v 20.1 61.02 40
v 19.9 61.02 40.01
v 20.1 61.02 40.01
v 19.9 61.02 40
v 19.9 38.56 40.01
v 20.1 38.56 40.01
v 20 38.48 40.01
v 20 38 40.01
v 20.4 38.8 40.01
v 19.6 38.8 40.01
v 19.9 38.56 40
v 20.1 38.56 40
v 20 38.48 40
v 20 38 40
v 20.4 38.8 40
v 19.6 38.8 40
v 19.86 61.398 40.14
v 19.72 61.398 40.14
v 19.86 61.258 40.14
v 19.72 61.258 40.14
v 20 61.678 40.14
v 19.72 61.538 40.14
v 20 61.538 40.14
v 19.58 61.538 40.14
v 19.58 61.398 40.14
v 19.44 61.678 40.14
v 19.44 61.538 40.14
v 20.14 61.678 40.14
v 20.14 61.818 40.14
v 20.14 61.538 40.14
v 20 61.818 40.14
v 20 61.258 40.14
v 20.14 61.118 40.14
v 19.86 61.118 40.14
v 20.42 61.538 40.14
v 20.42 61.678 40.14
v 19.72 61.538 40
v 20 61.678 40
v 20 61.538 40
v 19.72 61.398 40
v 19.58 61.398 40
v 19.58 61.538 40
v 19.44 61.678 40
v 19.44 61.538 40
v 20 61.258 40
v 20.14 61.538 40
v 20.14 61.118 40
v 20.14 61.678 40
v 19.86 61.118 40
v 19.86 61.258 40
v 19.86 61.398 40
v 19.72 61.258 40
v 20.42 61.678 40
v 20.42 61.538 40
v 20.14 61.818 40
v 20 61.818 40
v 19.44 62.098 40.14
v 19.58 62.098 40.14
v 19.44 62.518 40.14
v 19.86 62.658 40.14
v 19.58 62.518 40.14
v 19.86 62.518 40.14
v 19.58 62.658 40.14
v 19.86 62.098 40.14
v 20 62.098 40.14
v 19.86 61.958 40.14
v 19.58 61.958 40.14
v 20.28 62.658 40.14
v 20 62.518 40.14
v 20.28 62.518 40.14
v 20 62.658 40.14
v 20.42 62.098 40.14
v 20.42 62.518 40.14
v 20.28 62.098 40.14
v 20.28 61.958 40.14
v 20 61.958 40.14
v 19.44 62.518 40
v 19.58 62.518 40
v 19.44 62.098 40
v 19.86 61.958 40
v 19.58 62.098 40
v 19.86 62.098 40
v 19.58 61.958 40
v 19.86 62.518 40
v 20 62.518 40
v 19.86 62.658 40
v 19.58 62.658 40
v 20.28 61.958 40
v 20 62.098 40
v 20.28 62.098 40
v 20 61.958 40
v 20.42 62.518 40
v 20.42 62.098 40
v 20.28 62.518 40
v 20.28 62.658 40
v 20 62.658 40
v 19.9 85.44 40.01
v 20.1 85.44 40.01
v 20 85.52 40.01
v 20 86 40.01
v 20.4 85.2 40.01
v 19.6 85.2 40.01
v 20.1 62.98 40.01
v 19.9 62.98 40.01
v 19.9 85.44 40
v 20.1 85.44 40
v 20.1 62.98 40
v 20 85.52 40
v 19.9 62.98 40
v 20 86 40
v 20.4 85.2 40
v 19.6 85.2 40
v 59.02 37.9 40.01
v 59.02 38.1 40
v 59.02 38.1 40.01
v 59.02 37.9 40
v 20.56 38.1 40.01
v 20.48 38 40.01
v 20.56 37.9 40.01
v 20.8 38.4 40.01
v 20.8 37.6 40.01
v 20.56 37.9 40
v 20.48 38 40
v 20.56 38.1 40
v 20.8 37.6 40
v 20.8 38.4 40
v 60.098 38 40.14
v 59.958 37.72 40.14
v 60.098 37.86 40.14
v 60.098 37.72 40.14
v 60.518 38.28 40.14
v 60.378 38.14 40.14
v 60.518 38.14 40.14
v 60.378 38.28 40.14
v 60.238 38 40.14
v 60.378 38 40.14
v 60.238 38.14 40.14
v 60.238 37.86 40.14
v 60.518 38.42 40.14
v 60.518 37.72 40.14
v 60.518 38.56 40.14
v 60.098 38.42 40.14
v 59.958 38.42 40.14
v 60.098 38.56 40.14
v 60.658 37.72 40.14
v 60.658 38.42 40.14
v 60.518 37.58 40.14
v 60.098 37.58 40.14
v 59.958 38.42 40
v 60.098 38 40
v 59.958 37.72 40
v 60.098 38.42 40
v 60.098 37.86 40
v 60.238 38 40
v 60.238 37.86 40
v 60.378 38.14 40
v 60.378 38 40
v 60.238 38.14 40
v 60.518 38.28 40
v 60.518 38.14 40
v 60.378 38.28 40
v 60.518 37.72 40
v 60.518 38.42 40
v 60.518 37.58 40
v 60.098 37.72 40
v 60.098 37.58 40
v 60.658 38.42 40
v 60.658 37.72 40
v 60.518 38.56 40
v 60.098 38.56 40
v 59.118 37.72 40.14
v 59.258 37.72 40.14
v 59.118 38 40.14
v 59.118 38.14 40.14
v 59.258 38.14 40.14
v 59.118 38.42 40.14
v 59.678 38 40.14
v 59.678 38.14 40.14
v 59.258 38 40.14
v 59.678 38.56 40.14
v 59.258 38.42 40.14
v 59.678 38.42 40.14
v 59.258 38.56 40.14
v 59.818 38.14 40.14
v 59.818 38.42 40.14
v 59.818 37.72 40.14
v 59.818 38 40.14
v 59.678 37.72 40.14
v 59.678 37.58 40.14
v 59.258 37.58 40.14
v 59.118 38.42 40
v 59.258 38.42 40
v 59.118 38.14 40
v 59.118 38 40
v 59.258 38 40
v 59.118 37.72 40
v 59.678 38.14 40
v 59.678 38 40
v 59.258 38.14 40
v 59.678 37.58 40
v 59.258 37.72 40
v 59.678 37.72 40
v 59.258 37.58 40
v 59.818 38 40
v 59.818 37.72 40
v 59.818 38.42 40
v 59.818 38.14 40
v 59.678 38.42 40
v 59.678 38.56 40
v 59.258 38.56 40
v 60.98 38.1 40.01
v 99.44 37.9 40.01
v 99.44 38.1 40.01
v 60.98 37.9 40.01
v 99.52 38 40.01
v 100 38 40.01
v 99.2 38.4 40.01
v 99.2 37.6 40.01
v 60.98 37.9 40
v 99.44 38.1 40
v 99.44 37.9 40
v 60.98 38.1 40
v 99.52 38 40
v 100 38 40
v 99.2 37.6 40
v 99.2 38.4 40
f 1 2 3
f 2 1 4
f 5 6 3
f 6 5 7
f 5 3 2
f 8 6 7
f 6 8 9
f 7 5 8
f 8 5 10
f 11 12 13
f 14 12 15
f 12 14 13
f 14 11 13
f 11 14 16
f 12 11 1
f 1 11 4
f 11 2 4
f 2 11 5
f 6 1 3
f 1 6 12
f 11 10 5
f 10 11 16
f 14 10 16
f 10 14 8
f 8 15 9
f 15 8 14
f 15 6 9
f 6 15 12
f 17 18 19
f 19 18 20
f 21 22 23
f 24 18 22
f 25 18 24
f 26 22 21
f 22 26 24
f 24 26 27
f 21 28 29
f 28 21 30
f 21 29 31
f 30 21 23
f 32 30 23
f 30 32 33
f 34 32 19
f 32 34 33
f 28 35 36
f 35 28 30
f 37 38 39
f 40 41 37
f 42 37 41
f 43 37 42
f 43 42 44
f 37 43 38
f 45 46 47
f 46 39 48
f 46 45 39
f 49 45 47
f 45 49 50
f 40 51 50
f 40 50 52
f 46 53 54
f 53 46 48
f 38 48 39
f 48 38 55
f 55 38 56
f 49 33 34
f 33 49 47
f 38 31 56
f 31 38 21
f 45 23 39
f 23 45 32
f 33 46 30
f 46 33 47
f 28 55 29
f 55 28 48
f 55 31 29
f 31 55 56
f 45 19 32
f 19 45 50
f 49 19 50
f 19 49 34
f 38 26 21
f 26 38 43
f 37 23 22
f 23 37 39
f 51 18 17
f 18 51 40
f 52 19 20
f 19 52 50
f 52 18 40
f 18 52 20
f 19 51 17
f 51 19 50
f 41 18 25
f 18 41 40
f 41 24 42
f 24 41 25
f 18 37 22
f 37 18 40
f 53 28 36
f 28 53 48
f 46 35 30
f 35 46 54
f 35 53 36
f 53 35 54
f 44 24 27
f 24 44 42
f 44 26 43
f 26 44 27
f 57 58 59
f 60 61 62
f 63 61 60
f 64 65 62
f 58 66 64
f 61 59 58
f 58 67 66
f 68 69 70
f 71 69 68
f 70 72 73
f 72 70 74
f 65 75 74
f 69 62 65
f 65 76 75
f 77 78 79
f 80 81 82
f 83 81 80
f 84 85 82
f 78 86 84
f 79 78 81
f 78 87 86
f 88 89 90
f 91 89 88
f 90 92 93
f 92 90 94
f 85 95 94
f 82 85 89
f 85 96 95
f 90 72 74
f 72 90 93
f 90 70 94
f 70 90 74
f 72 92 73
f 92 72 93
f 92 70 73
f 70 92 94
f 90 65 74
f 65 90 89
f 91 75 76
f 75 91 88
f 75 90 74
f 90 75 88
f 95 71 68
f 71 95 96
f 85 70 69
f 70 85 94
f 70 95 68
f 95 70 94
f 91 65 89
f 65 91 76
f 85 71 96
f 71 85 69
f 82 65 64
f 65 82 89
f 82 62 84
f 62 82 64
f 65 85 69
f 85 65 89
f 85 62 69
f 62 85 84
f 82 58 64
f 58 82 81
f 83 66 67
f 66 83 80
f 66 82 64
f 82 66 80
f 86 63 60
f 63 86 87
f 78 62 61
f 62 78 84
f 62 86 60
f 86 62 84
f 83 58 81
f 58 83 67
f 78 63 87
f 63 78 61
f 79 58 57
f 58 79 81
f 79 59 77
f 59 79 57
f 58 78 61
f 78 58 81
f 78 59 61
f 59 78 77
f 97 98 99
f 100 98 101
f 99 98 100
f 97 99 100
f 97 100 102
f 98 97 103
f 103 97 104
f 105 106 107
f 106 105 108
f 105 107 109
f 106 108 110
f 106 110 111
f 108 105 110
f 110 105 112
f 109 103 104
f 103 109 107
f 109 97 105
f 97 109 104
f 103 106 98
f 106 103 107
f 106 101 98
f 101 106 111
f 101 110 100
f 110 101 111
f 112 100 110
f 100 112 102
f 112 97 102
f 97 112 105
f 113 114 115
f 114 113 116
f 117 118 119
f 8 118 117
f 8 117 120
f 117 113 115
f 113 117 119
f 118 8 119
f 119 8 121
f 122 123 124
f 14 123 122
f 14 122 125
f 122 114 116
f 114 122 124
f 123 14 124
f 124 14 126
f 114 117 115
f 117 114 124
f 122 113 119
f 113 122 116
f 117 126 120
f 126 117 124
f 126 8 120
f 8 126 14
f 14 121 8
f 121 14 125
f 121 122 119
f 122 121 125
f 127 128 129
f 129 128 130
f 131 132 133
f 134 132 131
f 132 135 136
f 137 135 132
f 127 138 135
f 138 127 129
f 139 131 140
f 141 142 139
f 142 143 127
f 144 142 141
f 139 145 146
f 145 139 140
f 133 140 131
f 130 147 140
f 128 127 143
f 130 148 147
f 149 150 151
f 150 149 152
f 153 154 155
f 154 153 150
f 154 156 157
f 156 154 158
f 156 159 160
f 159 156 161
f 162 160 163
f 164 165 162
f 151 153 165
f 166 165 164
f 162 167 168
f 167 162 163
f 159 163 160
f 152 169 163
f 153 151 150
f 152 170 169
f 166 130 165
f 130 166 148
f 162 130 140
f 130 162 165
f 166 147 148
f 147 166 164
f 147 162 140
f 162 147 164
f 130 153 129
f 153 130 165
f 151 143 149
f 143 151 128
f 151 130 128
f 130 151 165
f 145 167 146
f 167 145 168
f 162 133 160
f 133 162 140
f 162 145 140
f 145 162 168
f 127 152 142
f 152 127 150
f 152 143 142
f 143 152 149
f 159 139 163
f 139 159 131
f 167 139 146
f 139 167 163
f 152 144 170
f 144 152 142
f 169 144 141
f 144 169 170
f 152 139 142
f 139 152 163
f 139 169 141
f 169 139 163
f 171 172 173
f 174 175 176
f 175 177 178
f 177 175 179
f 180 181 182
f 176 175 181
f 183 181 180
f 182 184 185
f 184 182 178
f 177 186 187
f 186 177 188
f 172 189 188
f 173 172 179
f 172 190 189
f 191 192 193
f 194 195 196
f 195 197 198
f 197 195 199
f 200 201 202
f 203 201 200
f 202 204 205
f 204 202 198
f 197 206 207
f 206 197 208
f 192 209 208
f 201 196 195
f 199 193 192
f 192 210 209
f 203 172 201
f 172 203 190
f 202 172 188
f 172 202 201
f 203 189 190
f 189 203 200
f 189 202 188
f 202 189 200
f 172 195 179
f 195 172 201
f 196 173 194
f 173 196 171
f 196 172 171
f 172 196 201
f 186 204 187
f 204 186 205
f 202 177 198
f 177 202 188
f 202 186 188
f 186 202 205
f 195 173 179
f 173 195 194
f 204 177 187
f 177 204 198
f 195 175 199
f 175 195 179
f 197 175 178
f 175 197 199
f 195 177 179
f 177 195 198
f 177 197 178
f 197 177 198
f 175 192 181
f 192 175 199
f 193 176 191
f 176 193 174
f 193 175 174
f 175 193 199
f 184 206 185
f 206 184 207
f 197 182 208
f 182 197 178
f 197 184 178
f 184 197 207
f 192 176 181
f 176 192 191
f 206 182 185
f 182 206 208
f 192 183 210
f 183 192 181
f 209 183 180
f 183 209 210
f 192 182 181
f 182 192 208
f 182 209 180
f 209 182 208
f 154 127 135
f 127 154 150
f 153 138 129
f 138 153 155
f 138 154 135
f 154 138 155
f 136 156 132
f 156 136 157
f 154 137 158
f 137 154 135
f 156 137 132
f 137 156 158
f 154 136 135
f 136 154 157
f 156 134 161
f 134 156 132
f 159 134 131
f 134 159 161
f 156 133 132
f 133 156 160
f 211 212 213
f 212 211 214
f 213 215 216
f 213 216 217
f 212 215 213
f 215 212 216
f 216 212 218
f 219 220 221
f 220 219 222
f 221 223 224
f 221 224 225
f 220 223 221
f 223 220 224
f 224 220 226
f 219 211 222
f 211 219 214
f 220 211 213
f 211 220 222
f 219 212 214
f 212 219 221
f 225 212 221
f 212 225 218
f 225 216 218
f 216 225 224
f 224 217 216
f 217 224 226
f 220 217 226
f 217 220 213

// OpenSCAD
// file: ../libraries/TextGenerator.scad
//Draw text
// scale([4,4,4]) drawtext("Hello World!");

//Draw character set
//scale([2,2,2]) drawtext(" !\"#$%&'()*+,-./0123456789:;<=>?@ABCDEFGHIJKLMNOPQRSTUVWXYZ[\\]^_`abcdefghijklmnopqrstuvwxyz{|}");

module drawtext(text) {
	//Characters
	chars = " !\"#$%&'()*+,-./0123456789:;<=>?@ABCDEFGHIJKLMNOPQRSTUVWXYZ[\\]^_`abcdefghijklmnopqrstuvwxyz{|}";

	//Chracter table defining 5x7 characters
	//Adapted from: http://www.geocities.com/dinceraydin/djlcdsim/chartable.js
	char_table = [ [ 0, 0, 0, 0, 0, 0, 0],
                  [ 4, 0, 4, 4, 4, 4, 4],
                  [ 0, 0, 0, 0,10,10,10],
                  [10,10,31,10,31,10,10],
                  [ 4,30, 5,14,20,15, 4],
                  [ 3,19, 8, 4, 2,25,24],
                  [13,18,21, 8,20,18,12],
                  [ 0, 0, 0, 0, 8, 4,12],
                  [ 2, 4, 8, 8, 8, 4, 2],
                  [ 8, 4, 2, 2, 2, 4, 8],
                  [ 0, 4,21,14,21, 4, 0],
                  [ 0, 4, 4,31, 4, 4, 0],
                  [ 8, 4,12, 0, 0, 0, 0],
                  [ 0, 0, 0,31, 0, 0, 0],
                  [12,12, 0, 0, 0, 0, 0],
                  [ 0,16, 8, 4, 2, 1, 0],
                  [14,17,25,21,19,17,14],
                  [14, 4, 4, 4, 4,12, 4],
                  [31, 8, 4, 2, 1,17,14],
                  [14,17, 1, 2, 4, 2,31],
                  [ 2, 2,31,18,10, 6, 2],
                  [14,17, 1, 1,30,16,31],
                  [14,17,17,30,16, 8, 6],
                  [ 8, 8, 8, 4, 2, 1,31],
                  [14,17,17,14,17,17,14],
                  [12, 2, 1,15,17,17,14],
                  [ 0,12,12, 0,12,12, 0],
                  [ 8, 4,12, 0,12,12, 0],
                  [ 2, 4, 8,16, 8, 4, 2],
                  [ 0, 0,31, 0,31, 0, 0],
                  [16, 8, 4, 2, 4, 8,16],
                  [ 4, 0, 4, 2, 1,17,14],
                  [14,21,21,13, 1,17,14],
                  [17,17,31,17,17,17,14],
                  [30,17,17,30,17,17,30],
                  [14,17,16,16,16,17,14],
                  [30,17,17,17,17,17,30],
                  [31,16,16,30,16,16,31],
                  [16,16,16,30,16,16,31],
                  [15,17,17,23,16,17,14],
                  [17,17,17,31,17,17,17],
                  [14, 4, 4, 4, 4, 4,14],
                  [12,18, 2, 2, 2, 2, 7],
                  [17,18,20,24,20,18,17],
                  [31,16,16,16,16,16,16],
                  [17,17,17,21,21,27,17],
                  [17,17,19,21,25,17,17],
                  [14,17,17,17,17,17,14],
                  [16,16,16,30,17,17,30],
                  [13,18,21,17,17,17,14],
                  [17,18,20,30,17,17,30],
                  [30, 1, 1,14,16,16,15],
                  [ 4, 4, 4, 4, 4, 4,31],
                  [14,17,17,17,17,17,17],
                  [ 4,10,17,17,17,17,17],
                  [10,21,21,21,17,17,17],
                  [17,17,10, 4,10,17,17],
                  [ 4, 4, 4,10,17,17,17],
                  [31,16, 8, 4, 2, 1,31],
                  [14, 8, 8, 8, 8, 8,14],
                  [ 0, 1, 2, 4, 8,16, 0],
                  [14, 2, 2, 2, 2, 2,14],
                  [ 0, 0, 0, 0,17,10, 4],
                  [31, 0, 0, 0, 0, 0, 0],
                  [ 0, 0, 0, 0, 2, 4, 8],
                  [15,17,15, 1,14, 0, 0],
                  [30,17,17,25,22,16,16],
                  [14,17,16,16,14, 0, 0],
                  [15,17,17,19,13, 1, 1],
                  [14,16,31,17,14, 0, 0],
                  [ 8, 8, 8,28, 8, 9, 6],
                  [14, 1,15,17,15, 0, 0],
                  [17,17,17,25,22,16,16],
                  [14, 4, 4, 4,12, 0, 4],
                  [12,18, 2, 2, 2, 6, 2],
                  [18,20,24,20,18,16,16],
                  [14, 4, 4, 4, 4, 4,12],
                  [17,17,21,21,26, 0, 0],
                  [17,17,17,25,22, 0, 0],
                  [14,17,17,17,14, 0, 0],
                  [16,16,30,17,30, 0, 0],
                  [ 1, 1,15,19,13, 0, 0],
                  [16,16,16,25,22, 0, 0],
                  [30, 1,14,16,15, 0, 0],
                  [ 6, 9, 8, 8,28, 8, 8],
                  [13,19,17,17,17, 0, 0],
                  [ 4,10,17,17,17, 0, 0],
                  [10,21,21,17,17, 0, 0],
                  [17,10, 4,10,17, 0, 0],
                  [14, 1,15,17,17, 0, 0],
                  [31, 8, 4, 2,31, 0, 0],
                  [ 2, 4, 4, 8, 4, 4, 2],
                  [ 4, 4, 4, 4, 4, 4, 4],
                  [ 8, 4, 4, 2, 4, 4, 8] ];

	//Binary decode table
	dec_table = [ "00000", "00001", "00010", "00011", "00100", "00101",
  	            "00110", "00111", "01000", "01001", "01010", "01011",
  	            "01100", "01101", "01110", "01111", "10000", "10001",
  	            "10010", "10011", "10100", "10101", "10110", "10111",
	            "11000", "11001", "11010", "11011", "11100", "11101",
	            "11110", "11111" ];

	//Process string one character at a time
	for(itext = [0:len(text)-1]) {
		//Convert character to index
		assign(ichar = search(text[itext],chars,1)[0]) {
			//Decode character - rows
			for(irow = [0:6]) {
				assign(val = dec_table[char_table[ichar][irow]]) {
					//Decode character - cols
					for(icol = [0:4]) {
						assign(bit = search(val[icol],"01",1)[0]) {
							if(bit) {
								//Output cube
								translate([icol + (6*itext), irow, 0])
									cube([1.0001,1.0001,1]);
							}
						}
					}
				}
			}
		}
	}
}
// file: epiphany-parameters.scad
// Epiphany Cluster Fan Cooling 3D Design

// Copyright (c) 2014 by Jeremy Bennett <jeremy.bennett@embecosm.com>

// Epiphany Cluster Fan Cooling 3D Design is licensed under a Creative Commons
// Attribution-ShareAlike 3.0 Unported License.

// You should have received a copy of the license along with this work.  If not, 
// see <http://creativecommons.org/licenses/by-sa/3.0/>.

// -----------------------------------------------------------------------------

// Constants defining the fan base for Epiphany Cluster fan cooling

// Cluster boards are 86mm x 54mm. Mounting holes 3mm on the center of 6mm pads
// in each corner.

// The entire stack is 123mm to base of top layer.

// Fans are 120mm x 120mm x 25mm, with mounting hole centers 105mm apart in each
// corner.

// The fans are lifted 15mm from the base position, since there is no need to
// blow under the bottom board, while there is a need to blow across the top
// board.

FAN_DIAMETER = 120;				// Overall diameter of the fan.
FAN_THICKNESS = 25;				// Overall thickness of the fan
FAN_HOLE_OFFSET = 7.5;			// How far mounting holes centers are in from base
FAN_HOLE_DIAMETER = 4;			// Diameter of mounting holes
FAN_ELEVATION = 15;				// How far we lift fan from base of stack
LUG_INNER_THICKNESS = 5;		// Inner lug thickness (must sink screw head)
LUG_OUTER_THICKNESS = 5;		// Outer lug thickness
SCREW_HEAD_THICKNESS = 3;		// How deep to sink screw head
SCREW_HEAD_DIAMETER = 9;		// How wide is screw head
BOARD_WIDTH = 54;				// Width of parallella board
BOARD_LENGTH = 86;				// Length of parallella board
BOARD_HOLE_DIAMETER = 3.2;		// Diameter of parallella mounting holes (with play)
PAD_WIDTH = 6;					// Width (and length) of pad with mounting holes
BASE_THICKNESS = 5;				// Thickness of the main base
BASE_SCREW_HEAD_DIAMETER = 7;	// Screws holding base
BASE_SCREW_HEAD_THICKNESS = 3;// How deep to sink screw

// Useful derived constants
LUG_TOTAL_THICKNESS = LUG_INNER_THICKNESS + LUG_OUTER_THICKNESS;
X_OFF_1 = (FAN_DIAMETER - BOARD_LENGTH) / 2;
X_OFF_2 = (FAN_DIAMETER + BOARD_LENGTH) / 2;
X_OFF_3 = FAN_DIAMETER;
Y_OFF_1 = FAN_THICKNESS + LUG_TOTAL_THICKNESS;
Y_OFF_2 = Y_OFF_1 + BOARD_WIDTH;
Y_OFF_3 = Y_OFF_1 * 2 + BOARD_WIDTH;
PAD_OFF_1 = (PAD_WIDTH) / 2;
PAD_OFF_2 = 6 - (PAD_WIDTH) / 2;
// main file
// Epiphany Cluster Fan Cooling 3D Design

// Copyright (c) 2014 by Jeremy Bennett <jeremy.bennett@embecosm.com>

// Epiphany Cluster Fan Cooling 3D Design is licensed under a Creative Commons
// Attribution-ShareAlike 3.0 Unported License.

// You should have received a copy of the license along with this work.  If not, 
// see <http://creativecommons.org/licenses/by-sa/3.0/>.

// -----------------------------------------------------------------------------

// Dimension lines for the Epiphany fan base

// This requires TextGenerator.scad and dimlines.scad to be installed. You'll
// need to modify the directories below as necessary to find these.

include <epiphany-core.scad>				// The main module definitions
include <epiphany-parameters.scad>		// Parameters defining this base

// You may need to specify directories if you have these libraries elsewhere.

include <../libraries/TextGenerator.scad>
include <../libraries/dimlines.scad>

DIM_LINE_WIDTH = 0.2;

// Offsets in Z direction
Z_TOP = 40;
Z_BOTTOM = -5;


// Dimension of mounting holes in board width direction

color ("black")
	translate([X_OFF_1 + PAD_WIDTH / 2, Y_OFF_1 + PAD_WIDTH / 2, Z_TOP])
		rotate([0, 0, 90])
			dimensions (length=BOARD_WIDTH - PAD_WIDTH);


// Dimension of mounting holes in board length direction

color ("black")
	translate([X_OFF_1 + PAD_WIDTH / 2, Y_OFF_1 + PAD_WIDTH / 2, Z_TOP])
		rotate([0, 0, 0])
			dimensions (length=BOARD_LENGTH - PAD_WIDTH);
